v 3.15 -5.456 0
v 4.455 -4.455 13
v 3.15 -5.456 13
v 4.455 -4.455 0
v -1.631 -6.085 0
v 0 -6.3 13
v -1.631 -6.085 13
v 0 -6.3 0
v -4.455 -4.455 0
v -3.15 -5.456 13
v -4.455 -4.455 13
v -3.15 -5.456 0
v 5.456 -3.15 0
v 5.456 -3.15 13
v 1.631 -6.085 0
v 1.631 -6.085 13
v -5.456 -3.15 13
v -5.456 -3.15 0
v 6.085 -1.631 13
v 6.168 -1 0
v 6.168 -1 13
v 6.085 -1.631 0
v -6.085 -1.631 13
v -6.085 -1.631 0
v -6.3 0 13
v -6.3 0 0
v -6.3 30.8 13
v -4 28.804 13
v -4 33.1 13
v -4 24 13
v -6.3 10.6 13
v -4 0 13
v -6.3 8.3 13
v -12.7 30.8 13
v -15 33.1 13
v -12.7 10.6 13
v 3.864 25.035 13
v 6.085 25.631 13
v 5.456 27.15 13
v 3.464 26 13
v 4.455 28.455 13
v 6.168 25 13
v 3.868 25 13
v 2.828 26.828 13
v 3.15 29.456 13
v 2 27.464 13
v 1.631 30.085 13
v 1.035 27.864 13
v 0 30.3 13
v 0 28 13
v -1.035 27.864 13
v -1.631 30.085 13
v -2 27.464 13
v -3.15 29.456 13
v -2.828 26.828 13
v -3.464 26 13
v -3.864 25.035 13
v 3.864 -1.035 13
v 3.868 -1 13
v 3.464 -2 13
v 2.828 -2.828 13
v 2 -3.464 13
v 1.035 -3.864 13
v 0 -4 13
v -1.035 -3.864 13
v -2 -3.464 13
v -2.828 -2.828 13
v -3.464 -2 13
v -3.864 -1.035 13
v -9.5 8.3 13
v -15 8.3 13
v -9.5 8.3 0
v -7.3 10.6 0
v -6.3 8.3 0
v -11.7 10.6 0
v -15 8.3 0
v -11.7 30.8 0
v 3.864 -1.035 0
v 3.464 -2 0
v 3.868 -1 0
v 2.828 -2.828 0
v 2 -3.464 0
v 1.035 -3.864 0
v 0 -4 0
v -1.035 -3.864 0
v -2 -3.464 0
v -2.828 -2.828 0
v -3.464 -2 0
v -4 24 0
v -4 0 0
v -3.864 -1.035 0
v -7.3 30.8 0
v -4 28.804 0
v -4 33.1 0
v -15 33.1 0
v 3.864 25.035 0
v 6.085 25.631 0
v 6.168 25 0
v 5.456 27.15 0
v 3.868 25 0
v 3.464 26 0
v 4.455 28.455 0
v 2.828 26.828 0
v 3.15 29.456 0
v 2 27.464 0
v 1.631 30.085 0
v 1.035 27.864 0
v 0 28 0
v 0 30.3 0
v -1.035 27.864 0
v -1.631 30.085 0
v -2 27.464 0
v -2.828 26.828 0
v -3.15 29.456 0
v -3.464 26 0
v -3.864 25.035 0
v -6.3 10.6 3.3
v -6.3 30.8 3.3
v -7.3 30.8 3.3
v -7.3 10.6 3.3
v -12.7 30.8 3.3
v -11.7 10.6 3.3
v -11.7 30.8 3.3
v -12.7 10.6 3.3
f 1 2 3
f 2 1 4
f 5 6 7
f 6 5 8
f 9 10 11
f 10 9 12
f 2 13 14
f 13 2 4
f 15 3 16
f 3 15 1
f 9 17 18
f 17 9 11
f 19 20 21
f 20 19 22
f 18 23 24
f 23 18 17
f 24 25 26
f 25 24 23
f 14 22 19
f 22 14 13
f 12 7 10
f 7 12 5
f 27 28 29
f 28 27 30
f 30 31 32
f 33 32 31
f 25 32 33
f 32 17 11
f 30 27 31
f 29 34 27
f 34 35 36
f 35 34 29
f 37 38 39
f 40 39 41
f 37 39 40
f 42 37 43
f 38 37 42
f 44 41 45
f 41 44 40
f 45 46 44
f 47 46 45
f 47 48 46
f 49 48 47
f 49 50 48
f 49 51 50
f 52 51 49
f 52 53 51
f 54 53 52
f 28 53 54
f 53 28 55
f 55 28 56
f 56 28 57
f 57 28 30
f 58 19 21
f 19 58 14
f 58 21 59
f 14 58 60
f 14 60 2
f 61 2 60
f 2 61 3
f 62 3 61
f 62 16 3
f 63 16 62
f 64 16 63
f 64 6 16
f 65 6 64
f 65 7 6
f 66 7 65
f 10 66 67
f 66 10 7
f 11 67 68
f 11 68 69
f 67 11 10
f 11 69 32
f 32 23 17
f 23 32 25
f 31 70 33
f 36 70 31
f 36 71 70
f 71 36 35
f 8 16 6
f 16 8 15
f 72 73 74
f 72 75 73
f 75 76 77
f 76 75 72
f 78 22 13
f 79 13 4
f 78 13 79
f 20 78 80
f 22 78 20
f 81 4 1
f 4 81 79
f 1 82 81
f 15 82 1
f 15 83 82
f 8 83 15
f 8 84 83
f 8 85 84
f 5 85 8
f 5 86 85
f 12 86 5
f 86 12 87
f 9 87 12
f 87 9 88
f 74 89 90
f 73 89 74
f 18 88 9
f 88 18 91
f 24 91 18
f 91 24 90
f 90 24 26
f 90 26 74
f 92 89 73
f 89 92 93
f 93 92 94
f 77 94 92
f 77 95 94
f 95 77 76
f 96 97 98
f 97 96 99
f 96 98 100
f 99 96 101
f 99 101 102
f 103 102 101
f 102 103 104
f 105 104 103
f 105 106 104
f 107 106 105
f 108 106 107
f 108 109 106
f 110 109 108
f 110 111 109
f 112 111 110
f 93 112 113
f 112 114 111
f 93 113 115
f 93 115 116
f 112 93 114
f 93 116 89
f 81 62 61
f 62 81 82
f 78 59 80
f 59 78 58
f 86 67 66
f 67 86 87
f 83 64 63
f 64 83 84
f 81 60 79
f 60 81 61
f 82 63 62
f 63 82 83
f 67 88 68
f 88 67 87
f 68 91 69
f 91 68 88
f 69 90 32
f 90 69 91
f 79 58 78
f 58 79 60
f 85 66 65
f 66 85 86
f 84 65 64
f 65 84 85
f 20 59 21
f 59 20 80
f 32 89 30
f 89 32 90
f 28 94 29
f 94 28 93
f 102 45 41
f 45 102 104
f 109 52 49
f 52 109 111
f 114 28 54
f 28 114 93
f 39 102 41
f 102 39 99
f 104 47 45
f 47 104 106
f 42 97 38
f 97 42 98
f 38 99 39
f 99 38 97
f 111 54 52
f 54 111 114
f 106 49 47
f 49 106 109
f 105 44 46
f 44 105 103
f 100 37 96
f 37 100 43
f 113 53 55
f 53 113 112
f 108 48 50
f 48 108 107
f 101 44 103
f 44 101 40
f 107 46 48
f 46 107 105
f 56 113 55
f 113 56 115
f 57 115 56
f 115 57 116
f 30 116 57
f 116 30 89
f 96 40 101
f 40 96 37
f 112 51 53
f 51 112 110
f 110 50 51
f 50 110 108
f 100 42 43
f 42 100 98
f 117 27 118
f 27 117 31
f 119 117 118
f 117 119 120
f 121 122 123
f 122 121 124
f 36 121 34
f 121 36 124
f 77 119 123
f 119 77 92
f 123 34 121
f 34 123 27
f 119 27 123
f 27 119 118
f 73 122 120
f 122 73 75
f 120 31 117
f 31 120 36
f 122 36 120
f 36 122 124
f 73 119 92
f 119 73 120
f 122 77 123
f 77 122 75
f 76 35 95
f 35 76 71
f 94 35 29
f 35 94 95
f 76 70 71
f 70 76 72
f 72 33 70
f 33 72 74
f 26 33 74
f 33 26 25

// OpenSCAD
// file: parameters.scad
//
// common.scad
//

$fn = 24;

radius_3mm = 1.7;
radius_4mm = 2.2;
diam_8mm = 8;
radius_8mm = diam_8mm / 2;

// tunables

part_thickness = 2.3; // see how it slices

// stats about your i3
rod_frame_gap = 24.8;
frame_thickness = 6.8;

// distance between lower and upper y bars
y_bars_gap = 16;

// size of the endstop
endstop_w = 20 + 0.2;
endstop_h = 10.5 + 0.2;
endstop_d = 6 + 0.2 + 0.2;

// useful shorthand
pt2 = part_thickness / 2;
// file: common.scad
//
// common.scad
//

include <parameters.scad>

clip_h = endstop_h + part_thickness;
holder_d = endstop_d + part_thickness * 2;
holder_w = endstop_w + part_thickness * 2;

module endstop_holder() {
	difference() {
		translate([-holder_d / 2, radius_8mm, 0])
			cube([holder_d, holder_w, clip_h]);

		translate([-holder_d / 2, radius_8mm, 0]) {
			// cutout endstop hole
			translate([part_thickness, part_thickness, part_thickness + 1]) cube([endstop_d, endstop_w, endstop_h + 2]);

			// cutout endstop wire hole
			translate([part_thickness + 1, part_thickness, -0.5]) cube([endstop_d - 2, endstop_w, part_thickness + 2]);
		}
		// cutout the rod
		cylinder(r=radius_8mm, h=clip_h + 1);
	}
}

module screw(r=radius_3mm, length=10, cap=2, hex=false) {
	cylinder(r=r, h=length);
	translate([0, 0, length])
		difference() {
			cylinder(r1=r+1, r2=r + 0.8, h=cap);
			translate([0, 0, cap]) {
				if (hex) {
					cylinder(r=r, h=2, $fn=6, center=true);
				}
				else {
					rotate([0, 0, 45])
						cube([r * 2, r / 4, 2], center=true);
					rotate([0, 0, 135])
						cube([r * 2, r / 4, 2], center=true);
				}
			}
		}
}
// main file
//
// i3-y-endstop.scad
//

include <common.scad>

y_bar_dist = y_bars_gap + radius_8mm * 2;

module y_carriage_rods() {
	color([0.9,0.9,0.9])
		rotate([90,0,0]) {
			cylinder(r=radius_8mm, h=100, center=true);
			translate([0,y_bar_dist,0]) cylinder(r=radius_8mm, h=100, center=true);
		}
}

module rod_clip() {
	clip_r = radius_8mm + part_thickness;
	clip_h = endstop_h + part_thickness;
	difference() {
		cylinder(r=clip_r, h=clip_h);
		translate([0,0,clip_h/2]) cylinder(r=radius_8mm, h=clip_h + 1, center=true);
		translate([radius_8mm + 1, 3, clip_h / 2]) cube([4, 8, clip_h+1], center=true);
		translate([0,radius_8mm,clip_h / 2]) cube([diam_8mm,diam_8mm,clip_h+1], center=true);
	}
}

module i3_y_endstop() {
	union() {

		rod_clip();
		translate([0,y_bar_dist,clip_h])
			rotate([180,0,0])
				rod_clip();

		translate([-radius_8mm - pt2, y_bar_dist / 2, clip_h / 2])
			cube([part_thickness, y_bar_dist, clip_h], center=true);

		translate([-holder_d / 2 - radius_8mm,part_thickness+y_bars_gap-14,0])
			endstop_holder();

	} // union
}

// y_carriage_rods();

i3_y_endstop();
